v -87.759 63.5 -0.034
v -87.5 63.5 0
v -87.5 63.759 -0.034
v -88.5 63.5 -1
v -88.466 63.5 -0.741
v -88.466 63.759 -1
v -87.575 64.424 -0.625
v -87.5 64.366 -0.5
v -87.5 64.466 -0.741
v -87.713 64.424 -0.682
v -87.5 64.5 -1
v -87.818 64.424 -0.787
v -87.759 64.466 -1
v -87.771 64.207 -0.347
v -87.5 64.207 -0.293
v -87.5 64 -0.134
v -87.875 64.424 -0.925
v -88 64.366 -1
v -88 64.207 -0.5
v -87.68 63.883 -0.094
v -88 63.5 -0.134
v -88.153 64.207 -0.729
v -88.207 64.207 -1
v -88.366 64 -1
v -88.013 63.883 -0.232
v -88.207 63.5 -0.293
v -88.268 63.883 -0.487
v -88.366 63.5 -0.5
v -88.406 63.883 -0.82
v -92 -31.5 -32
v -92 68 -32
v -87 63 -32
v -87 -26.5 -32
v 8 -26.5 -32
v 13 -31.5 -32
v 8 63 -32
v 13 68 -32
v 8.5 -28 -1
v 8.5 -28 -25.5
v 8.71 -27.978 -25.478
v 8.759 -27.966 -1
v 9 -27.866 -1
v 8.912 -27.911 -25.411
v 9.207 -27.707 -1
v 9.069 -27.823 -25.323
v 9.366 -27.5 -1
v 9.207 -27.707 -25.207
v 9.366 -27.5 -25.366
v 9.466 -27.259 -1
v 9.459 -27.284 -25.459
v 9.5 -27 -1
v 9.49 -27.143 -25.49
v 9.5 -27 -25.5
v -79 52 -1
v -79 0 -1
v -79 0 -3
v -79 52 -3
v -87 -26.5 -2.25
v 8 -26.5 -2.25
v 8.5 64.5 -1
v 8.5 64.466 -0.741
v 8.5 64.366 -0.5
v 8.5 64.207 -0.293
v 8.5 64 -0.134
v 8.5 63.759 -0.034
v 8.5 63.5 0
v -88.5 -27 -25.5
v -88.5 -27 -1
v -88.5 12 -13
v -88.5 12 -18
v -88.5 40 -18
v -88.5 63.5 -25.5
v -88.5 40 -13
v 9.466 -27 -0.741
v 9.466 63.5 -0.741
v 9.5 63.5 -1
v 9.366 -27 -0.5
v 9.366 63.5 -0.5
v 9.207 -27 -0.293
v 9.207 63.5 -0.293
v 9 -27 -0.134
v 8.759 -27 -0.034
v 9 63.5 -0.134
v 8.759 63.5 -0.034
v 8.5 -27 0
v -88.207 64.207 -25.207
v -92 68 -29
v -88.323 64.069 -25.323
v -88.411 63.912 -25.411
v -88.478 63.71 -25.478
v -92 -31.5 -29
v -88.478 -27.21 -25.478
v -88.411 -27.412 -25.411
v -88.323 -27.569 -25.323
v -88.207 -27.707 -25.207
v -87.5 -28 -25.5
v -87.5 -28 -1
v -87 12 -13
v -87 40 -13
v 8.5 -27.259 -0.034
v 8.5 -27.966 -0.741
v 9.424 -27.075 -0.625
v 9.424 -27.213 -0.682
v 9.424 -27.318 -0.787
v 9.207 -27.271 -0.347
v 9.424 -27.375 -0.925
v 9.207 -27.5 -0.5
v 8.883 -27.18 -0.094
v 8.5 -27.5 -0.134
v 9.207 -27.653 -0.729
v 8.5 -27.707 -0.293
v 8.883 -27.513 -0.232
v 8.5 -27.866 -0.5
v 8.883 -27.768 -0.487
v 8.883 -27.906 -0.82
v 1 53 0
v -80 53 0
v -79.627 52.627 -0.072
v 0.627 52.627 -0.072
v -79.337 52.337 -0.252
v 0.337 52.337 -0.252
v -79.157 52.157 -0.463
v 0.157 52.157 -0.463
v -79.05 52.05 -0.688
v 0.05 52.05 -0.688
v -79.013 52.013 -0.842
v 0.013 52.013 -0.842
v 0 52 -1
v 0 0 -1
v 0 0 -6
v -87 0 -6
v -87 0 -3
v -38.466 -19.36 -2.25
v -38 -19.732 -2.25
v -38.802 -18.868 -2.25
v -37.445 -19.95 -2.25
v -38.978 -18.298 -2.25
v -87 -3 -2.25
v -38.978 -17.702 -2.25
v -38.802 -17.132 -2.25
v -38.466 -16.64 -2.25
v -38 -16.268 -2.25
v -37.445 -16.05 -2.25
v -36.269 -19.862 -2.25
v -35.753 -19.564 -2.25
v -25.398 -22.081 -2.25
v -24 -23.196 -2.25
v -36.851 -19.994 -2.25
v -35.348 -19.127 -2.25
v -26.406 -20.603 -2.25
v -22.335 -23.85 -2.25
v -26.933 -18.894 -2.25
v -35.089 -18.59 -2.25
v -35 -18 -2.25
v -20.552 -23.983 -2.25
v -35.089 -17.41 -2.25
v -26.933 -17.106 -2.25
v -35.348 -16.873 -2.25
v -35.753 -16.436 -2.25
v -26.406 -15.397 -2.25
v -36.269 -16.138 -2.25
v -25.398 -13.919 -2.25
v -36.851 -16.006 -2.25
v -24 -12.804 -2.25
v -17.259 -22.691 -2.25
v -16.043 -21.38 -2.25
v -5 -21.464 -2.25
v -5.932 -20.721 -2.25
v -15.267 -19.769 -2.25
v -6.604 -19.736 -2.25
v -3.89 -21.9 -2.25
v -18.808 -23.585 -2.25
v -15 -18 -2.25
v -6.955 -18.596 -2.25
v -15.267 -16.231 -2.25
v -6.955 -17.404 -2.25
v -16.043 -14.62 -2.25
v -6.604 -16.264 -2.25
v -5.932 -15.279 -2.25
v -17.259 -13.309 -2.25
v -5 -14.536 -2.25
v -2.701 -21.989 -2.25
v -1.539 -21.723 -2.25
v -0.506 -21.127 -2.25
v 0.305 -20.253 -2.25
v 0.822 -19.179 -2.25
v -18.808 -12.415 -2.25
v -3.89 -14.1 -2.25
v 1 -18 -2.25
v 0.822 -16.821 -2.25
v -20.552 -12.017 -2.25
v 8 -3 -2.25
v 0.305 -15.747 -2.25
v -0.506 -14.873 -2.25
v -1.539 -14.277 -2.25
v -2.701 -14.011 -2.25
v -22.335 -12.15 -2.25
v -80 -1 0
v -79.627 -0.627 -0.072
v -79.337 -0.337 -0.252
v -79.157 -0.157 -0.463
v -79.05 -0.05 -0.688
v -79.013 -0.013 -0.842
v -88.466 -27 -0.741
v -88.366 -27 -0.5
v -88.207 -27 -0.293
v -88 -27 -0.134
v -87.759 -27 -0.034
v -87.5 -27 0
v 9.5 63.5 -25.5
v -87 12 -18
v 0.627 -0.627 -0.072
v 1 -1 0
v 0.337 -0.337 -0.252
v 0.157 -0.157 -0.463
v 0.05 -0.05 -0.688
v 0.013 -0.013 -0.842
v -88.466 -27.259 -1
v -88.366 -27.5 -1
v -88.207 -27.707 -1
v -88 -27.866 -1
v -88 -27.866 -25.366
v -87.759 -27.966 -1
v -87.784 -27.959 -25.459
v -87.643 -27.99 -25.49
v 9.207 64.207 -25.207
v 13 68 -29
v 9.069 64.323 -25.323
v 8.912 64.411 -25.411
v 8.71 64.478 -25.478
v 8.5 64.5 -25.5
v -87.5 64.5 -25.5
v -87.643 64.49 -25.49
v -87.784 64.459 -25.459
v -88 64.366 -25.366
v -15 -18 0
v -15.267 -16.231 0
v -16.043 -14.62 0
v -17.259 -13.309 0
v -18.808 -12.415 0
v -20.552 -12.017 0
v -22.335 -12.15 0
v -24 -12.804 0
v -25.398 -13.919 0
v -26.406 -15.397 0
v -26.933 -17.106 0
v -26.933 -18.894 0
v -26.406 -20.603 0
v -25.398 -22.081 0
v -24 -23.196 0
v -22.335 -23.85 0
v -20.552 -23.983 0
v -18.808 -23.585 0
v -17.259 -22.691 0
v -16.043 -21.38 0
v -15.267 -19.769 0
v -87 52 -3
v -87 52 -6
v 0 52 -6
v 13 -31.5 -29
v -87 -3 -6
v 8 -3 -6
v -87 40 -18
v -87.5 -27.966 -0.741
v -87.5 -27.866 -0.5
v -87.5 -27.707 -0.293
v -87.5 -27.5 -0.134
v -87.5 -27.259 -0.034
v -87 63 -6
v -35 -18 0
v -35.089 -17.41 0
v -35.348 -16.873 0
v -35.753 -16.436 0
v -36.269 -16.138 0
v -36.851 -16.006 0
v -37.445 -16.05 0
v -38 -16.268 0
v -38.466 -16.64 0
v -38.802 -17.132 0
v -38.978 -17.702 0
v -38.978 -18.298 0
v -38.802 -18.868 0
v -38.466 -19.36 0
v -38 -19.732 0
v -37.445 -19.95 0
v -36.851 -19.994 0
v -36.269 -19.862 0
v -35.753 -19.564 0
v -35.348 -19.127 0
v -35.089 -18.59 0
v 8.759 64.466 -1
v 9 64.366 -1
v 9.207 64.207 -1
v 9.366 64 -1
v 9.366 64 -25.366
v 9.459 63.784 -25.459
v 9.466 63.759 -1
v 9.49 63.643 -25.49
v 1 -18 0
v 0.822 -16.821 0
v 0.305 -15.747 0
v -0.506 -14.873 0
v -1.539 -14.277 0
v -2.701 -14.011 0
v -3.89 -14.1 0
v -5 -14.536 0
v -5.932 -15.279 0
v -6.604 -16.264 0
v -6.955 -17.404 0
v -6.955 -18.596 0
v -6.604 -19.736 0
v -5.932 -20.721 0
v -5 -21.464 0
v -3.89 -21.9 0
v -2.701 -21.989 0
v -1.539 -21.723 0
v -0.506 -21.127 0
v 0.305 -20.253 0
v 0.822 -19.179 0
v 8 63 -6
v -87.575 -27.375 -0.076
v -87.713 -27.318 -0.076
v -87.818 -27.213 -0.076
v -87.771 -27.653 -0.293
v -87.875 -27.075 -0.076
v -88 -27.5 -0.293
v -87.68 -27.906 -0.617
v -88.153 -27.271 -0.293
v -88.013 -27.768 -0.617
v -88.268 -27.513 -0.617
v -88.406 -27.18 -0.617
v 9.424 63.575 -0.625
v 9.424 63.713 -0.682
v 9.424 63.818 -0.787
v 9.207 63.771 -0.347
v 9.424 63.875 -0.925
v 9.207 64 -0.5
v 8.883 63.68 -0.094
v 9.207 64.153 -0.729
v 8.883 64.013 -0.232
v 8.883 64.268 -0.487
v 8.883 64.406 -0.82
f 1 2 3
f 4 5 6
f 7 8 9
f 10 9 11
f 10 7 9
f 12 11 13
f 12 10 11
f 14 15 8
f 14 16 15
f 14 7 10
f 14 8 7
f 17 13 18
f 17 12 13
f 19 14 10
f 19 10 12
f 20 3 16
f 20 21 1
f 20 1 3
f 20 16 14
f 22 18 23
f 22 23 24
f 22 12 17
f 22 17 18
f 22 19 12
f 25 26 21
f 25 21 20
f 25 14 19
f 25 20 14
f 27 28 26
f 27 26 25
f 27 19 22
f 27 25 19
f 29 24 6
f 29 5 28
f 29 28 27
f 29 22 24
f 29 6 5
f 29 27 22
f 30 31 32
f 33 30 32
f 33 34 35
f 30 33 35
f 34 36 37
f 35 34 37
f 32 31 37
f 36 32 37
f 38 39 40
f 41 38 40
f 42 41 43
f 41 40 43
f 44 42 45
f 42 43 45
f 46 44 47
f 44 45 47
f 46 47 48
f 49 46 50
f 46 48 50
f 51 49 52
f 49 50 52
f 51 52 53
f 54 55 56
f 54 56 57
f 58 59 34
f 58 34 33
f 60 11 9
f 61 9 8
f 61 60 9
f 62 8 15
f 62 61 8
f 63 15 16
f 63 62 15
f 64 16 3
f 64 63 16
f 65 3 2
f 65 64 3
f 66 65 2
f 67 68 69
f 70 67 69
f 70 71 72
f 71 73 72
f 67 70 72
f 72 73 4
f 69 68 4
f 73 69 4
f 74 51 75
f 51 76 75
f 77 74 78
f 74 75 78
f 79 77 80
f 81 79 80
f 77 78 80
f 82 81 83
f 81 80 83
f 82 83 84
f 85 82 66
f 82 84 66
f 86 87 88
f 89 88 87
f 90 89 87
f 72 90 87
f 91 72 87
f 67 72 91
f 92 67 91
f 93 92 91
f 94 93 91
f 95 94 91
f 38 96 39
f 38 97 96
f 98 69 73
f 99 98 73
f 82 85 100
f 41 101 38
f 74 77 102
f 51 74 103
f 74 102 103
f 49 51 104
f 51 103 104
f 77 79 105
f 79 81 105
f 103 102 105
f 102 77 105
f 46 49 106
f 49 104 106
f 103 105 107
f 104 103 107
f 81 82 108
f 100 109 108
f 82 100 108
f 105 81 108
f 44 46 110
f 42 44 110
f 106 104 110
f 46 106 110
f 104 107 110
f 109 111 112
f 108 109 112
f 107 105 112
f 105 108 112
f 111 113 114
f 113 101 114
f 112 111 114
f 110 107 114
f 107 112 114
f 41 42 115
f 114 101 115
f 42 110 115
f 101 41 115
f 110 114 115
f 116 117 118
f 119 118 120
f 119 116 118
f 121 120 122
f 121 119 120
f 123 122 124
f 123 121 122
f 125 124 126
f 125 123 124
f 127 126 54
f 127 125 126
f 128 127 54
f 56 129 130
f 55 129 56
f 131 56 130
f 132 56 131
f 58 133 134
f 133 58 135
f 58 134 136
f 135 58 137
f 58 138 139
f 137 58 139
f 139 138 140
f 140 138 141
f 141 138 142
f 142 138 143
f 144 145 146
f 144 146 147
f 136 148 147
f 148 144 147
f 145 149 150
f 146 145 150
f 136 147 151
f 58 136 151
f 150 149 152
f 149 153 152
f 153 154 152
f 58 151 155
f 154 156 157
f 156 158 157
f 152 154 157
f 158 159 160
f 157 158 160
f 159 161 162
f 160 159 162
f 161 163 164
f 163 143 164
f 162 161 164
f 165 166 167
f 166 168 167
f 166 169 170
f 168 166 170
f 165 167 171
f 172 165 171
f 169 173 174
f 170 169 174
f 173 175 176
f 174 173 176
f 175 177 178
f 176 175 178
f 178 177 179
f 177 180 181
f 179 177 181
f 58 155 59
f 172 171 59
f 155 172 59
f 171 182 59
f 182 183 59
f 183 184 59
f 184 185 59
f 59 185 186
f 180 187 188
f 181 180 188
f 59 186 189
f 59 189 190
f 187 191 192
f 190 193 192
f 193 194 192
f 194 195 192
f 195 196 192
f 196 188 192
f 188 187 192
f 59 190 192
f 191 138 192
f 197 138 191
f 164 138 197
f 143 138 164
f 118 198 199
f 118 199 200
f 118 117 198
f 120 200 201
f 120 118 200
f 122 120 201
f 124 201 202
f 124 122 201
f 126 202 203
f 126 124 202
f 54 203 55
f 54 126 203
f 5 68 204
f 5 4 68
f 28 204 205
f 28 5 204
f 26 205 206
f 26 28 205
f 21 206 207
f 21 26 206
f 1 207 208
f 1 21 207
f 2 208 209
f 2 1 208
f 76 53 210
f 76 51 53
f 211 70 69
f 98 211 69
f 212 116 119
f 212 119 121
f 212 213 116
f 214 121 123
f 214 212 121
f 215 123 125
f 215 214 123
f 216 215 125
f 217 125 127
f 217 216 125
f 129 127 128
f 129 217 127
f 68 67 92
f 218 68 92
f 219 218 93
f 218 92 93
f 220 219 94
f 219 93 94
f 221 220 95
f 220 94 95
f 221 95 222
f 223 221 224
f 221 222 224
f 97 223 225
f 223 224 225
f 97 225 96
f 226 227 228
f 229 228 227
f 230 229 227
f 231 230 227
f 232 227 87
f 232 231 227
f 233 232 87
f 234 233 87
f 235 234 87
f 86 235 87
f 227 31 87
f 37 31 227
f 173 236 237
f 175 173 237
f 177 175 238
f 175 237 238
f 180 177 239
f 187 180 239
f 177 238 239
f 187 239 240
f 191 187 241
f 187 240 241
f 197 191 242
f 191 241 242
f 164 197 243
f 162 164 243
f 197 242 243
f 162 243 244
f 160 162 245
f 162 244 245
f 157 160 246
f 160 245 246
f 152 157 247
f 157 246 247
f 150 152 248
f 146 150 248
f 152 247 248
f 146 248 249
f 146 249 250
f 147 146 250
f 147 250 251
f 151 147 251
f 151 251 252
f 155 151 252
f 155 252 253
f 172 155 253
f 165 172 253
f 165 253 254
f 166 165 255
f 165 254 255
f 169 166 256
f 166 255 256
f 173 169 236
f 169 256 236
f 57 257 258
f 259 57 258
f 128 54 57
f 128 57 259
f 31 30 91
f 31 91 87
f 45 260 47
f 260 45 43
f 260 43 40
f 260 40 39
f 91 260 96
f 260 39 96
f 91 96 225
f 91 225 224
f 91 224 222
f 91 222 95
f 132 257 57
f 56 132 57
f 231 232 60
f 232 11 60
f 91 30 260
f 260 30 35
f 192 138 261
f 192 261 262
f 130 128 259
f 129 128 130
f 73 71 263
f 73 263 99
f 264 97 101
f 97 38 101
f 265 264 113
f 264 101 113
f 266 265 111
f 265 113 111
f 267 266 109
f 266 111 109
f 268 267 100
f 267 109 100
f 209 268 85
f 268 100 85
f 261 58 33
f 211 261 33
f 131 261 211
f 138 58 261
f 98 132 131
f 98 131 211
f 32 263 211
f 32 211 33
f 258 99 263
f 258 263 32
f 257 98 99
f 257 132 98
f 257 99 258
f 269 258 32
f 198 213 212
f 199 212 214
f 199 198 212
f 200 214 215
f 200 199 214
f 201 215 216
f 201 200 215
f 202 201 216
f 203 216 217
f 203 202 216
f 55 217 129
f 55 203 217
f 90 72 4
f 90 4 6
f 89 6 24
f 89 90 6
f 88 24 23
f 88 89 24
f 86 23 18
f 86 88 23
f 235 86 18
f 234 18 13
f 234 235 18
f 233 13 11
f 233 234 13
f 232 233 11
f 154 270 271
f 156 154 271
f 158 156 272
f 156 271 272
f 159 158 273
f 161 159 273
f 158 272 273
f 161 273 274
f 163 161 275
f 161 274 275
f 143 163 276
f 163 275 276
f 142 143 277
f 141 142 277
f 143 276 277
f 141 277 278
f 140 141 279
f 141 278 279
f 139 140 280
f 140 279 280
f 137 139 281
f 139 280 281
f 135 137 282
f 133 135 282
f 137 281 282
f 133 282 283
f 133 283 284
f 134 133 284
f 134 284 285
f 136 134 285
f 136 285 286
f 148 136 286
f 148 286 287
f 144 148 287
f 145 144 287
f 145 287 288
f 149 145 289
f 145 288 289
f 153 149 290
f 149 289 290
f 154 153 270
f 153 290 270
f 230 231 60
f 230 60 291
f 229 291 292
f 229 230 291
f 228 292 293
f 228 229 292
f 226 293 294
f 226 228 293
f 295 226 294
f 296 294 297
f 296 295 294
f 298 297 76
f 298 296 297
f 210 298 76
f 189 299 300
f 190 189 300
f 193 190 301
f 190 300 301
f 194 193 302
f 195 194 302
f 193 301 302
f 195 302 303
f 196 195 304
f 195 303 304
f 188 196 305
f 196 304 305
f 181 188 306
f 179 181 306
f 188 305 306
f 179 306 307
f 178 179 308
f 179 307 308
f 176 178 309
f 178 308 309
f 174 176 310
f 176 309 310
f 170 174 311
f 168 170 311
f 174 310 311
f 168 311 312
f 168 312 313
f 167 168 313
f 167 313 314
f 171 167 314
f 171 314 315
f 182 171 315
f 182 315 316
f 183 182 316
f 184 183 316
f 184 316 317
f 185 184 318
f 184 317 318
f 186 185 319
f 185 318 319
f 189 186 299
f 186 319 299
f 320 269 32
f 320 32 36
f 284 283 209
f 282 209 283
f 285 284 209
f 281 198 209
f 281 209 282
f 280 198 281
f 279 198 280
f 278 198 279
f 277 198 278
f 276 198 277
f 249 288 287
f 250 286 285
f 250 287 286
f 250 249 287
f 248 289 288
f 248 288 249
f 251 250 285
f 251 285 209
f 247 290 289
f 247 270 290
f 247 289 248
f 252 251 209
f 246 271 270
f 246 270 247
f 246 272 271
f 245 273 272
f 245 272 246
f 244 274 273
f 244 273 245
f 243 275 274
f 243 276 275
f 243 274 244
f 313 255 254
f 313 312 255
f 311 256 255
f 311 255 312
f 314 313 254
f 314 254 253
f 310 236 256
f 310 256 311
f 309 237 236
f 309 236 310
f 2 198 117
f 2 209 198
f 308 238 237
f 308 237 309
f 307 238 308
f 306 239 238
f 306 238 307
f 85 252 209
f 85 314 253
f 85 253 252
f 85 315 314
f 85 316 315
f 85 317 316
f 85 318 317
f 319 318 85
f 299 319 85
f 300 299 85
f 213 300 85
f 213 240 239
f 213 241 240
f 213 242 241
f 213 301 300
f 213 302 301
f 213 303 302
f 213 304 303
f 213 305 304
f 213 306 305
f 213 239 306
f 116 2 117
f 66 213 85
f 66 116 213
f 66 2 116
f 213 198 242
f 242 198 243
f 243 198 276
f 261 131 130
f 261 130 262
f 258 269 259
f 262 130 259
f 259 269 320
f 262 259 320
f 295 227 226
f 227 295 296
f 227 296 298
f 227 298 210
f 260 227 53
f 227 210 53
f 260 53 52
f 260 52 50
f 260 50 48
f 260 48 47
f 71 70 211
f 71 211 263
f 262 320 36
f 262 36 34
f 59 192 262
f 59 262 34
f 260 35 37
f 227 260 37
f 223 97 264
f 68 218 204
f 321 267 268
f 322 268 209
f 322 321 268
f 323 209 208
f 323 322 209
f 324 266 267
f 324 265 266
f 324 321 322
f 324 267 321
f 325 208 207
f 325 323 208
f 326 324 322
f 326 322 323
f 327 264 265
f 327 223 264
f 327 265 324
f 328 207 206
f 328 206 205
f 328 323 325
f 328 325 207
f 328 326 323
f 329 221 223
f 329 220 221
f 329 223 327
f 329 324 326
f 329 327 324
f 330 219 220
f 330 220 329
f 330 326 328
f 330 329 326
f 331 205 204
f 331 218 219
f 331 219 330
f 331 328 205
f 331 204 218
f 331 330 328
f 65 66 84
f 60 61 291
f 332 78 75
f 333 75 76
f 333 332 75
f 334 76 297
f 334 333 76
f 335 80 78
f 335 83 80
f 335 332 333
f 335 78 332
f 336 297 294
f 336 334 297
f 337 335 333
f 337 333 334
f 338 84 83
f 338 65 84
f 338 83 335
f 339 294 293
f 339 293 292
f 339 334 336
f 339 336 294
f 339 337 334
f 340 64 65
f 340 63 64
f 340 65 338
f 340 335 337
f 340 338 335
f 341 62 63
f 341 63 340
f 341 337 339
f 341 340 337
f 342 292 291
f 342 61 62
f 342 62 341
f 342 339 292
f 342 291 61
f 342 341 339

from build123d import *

# Parameters (mm, degrees)
F1_DEPTH  = 6
F0_W      = 8
F0_H      = 52
F2_DEPTH  = 3
F0_W_2    = 98
F0_H_2    = 92.5
F3_DEPTH  = 32
F5_W      = 28
F5_H      = 5
F6_DEPTH  = 20
F0_W_3    = 95
F0_H_3    = 23.5
F0_R      = 2
F0_R_2    = 6
F0_R_3    = 4
F7_DEPTH  = 2.25
F9_W      = 105
F9_H      = 99.5
F9_W_2    = 95
F9_H_2    = 89.5
F10_DEPTH = 3
F11_SIZE  = 3.49999
F12_R     = 1


# Not quite as in the source:
# - a fillet or chamfer is up to 0.001 mm smaller than in the source, because OpenCascade refuses the exact size
# - a feature names something its author has since deleted; it is built from what else it names


with BuildPart() as f1:
    # F0 (on Top) → F1 (new body)
    with BuildSketch(Plane.XY):
        Polygon((0, 52), (0, 0), (-79, 0), (-87, 0), (-87, -3), (8, -3), (8, 63), (-87, 63), (-87, 52), (-79, 52), align=None)
    extrude(amount=-F1_DEPTH)

    # F0 (on Top) → F2 (join)
    with BuildSketch(Plane.XY):
        with Locations((-83, 26)):
            Rectangle(F0_W, F0_H)
    extrude(amount=-F2_DEPTH)

    # F0 (on Top) → F3 (join)
    with BuildSketch(Plane.XY):
        with Locations((-39.5, 18.25)):
            Rectangle(F0_W_2, F0_H_2)
        Polygon((-87, -3), (-87, 0), (-87, 52), (-87, 63), (8, 63), (8, -3), (8, -26.5), (-87, -26.5), align=None, mode=Mode.SUBTRACT)
    extrude(amount=-F3_DEPTH)

    # F5 (on offset) → F6 (cut)
    with BuildSketch(Plane.YZ.offset(-88.5)):
        with Locations((26, -15.5)):
            Rectangle(F5_W, F5_H)
    extrude(amount=F6_DEPTH, mode=Mode.SUBTRACT)

    # F0 (on Top) → F7 (join)
    with BuildSketch(Plane.XY):
        with Locations((-39.5, -14.75)):
            Rectangle(F0_W_3, F0_H_3)
        with Locations((-37, -18)):
            Circle(F0_R, mode=Mode.SUBTRACT)
        with Locations((-21, -18)):
            Circle(F0_R_2, mode=Mode.SUBTRACT)
        with Locations((-3, -18)):
            Circle(F0_R_3, mode=Mode.SUBTRACT)
    extrude(amount=-F7_DEPTH)

    # F9 (on offset) → F10 (join)
    with BuildSketch(Plane.XY.offset(-32)):
        with Locations((-39.5, 18.25)):
            Rectangle(F9_W, F9_H)
        with Locations((-39.5, 18.25)):
            Rectangle(F9_W_2, F9_H_2, mode=Mode.SUBTRACT)
    extrude(amount=F10_DEPTH)

    # F11 (size 3.5 in the source; OpenCascade refuses exactly that, so slightly less here)
    f11_edges = [f1.edges().sort_by_distance(p)[0] for p in [
        (-88.5, 18.25, -29),
        (-39.5, -28, -29),
        (9.5, 18.25, -29),
        (-39.5, 64.5, -29),
    ]]
    chamfer(f11_edges, length=F11_SIZE)

    # F12
    f12_edges = [f1.edges().sort_by_distance(p)[0] for p in [
        (-88.5, -28, -12.750005),
        (-39.5, -28, 0),
        (-88.5, 18.25, 0),
        (-39.5, 64.5, 0),
        (9.5, 18.25, 0),
        (0, 26, 0),
        (-39.5, 0, 0),
        (-79, 26, 0),
        (-39.5, 52, 0),
        (9.5, -28, -12.750005),
        (9.5, 64.5, -12.750005),
        (-88.5, 64.5, -12.750005),
    ]]
    fillet(f12_edges, radius=F12_R)


solid = f1.part
